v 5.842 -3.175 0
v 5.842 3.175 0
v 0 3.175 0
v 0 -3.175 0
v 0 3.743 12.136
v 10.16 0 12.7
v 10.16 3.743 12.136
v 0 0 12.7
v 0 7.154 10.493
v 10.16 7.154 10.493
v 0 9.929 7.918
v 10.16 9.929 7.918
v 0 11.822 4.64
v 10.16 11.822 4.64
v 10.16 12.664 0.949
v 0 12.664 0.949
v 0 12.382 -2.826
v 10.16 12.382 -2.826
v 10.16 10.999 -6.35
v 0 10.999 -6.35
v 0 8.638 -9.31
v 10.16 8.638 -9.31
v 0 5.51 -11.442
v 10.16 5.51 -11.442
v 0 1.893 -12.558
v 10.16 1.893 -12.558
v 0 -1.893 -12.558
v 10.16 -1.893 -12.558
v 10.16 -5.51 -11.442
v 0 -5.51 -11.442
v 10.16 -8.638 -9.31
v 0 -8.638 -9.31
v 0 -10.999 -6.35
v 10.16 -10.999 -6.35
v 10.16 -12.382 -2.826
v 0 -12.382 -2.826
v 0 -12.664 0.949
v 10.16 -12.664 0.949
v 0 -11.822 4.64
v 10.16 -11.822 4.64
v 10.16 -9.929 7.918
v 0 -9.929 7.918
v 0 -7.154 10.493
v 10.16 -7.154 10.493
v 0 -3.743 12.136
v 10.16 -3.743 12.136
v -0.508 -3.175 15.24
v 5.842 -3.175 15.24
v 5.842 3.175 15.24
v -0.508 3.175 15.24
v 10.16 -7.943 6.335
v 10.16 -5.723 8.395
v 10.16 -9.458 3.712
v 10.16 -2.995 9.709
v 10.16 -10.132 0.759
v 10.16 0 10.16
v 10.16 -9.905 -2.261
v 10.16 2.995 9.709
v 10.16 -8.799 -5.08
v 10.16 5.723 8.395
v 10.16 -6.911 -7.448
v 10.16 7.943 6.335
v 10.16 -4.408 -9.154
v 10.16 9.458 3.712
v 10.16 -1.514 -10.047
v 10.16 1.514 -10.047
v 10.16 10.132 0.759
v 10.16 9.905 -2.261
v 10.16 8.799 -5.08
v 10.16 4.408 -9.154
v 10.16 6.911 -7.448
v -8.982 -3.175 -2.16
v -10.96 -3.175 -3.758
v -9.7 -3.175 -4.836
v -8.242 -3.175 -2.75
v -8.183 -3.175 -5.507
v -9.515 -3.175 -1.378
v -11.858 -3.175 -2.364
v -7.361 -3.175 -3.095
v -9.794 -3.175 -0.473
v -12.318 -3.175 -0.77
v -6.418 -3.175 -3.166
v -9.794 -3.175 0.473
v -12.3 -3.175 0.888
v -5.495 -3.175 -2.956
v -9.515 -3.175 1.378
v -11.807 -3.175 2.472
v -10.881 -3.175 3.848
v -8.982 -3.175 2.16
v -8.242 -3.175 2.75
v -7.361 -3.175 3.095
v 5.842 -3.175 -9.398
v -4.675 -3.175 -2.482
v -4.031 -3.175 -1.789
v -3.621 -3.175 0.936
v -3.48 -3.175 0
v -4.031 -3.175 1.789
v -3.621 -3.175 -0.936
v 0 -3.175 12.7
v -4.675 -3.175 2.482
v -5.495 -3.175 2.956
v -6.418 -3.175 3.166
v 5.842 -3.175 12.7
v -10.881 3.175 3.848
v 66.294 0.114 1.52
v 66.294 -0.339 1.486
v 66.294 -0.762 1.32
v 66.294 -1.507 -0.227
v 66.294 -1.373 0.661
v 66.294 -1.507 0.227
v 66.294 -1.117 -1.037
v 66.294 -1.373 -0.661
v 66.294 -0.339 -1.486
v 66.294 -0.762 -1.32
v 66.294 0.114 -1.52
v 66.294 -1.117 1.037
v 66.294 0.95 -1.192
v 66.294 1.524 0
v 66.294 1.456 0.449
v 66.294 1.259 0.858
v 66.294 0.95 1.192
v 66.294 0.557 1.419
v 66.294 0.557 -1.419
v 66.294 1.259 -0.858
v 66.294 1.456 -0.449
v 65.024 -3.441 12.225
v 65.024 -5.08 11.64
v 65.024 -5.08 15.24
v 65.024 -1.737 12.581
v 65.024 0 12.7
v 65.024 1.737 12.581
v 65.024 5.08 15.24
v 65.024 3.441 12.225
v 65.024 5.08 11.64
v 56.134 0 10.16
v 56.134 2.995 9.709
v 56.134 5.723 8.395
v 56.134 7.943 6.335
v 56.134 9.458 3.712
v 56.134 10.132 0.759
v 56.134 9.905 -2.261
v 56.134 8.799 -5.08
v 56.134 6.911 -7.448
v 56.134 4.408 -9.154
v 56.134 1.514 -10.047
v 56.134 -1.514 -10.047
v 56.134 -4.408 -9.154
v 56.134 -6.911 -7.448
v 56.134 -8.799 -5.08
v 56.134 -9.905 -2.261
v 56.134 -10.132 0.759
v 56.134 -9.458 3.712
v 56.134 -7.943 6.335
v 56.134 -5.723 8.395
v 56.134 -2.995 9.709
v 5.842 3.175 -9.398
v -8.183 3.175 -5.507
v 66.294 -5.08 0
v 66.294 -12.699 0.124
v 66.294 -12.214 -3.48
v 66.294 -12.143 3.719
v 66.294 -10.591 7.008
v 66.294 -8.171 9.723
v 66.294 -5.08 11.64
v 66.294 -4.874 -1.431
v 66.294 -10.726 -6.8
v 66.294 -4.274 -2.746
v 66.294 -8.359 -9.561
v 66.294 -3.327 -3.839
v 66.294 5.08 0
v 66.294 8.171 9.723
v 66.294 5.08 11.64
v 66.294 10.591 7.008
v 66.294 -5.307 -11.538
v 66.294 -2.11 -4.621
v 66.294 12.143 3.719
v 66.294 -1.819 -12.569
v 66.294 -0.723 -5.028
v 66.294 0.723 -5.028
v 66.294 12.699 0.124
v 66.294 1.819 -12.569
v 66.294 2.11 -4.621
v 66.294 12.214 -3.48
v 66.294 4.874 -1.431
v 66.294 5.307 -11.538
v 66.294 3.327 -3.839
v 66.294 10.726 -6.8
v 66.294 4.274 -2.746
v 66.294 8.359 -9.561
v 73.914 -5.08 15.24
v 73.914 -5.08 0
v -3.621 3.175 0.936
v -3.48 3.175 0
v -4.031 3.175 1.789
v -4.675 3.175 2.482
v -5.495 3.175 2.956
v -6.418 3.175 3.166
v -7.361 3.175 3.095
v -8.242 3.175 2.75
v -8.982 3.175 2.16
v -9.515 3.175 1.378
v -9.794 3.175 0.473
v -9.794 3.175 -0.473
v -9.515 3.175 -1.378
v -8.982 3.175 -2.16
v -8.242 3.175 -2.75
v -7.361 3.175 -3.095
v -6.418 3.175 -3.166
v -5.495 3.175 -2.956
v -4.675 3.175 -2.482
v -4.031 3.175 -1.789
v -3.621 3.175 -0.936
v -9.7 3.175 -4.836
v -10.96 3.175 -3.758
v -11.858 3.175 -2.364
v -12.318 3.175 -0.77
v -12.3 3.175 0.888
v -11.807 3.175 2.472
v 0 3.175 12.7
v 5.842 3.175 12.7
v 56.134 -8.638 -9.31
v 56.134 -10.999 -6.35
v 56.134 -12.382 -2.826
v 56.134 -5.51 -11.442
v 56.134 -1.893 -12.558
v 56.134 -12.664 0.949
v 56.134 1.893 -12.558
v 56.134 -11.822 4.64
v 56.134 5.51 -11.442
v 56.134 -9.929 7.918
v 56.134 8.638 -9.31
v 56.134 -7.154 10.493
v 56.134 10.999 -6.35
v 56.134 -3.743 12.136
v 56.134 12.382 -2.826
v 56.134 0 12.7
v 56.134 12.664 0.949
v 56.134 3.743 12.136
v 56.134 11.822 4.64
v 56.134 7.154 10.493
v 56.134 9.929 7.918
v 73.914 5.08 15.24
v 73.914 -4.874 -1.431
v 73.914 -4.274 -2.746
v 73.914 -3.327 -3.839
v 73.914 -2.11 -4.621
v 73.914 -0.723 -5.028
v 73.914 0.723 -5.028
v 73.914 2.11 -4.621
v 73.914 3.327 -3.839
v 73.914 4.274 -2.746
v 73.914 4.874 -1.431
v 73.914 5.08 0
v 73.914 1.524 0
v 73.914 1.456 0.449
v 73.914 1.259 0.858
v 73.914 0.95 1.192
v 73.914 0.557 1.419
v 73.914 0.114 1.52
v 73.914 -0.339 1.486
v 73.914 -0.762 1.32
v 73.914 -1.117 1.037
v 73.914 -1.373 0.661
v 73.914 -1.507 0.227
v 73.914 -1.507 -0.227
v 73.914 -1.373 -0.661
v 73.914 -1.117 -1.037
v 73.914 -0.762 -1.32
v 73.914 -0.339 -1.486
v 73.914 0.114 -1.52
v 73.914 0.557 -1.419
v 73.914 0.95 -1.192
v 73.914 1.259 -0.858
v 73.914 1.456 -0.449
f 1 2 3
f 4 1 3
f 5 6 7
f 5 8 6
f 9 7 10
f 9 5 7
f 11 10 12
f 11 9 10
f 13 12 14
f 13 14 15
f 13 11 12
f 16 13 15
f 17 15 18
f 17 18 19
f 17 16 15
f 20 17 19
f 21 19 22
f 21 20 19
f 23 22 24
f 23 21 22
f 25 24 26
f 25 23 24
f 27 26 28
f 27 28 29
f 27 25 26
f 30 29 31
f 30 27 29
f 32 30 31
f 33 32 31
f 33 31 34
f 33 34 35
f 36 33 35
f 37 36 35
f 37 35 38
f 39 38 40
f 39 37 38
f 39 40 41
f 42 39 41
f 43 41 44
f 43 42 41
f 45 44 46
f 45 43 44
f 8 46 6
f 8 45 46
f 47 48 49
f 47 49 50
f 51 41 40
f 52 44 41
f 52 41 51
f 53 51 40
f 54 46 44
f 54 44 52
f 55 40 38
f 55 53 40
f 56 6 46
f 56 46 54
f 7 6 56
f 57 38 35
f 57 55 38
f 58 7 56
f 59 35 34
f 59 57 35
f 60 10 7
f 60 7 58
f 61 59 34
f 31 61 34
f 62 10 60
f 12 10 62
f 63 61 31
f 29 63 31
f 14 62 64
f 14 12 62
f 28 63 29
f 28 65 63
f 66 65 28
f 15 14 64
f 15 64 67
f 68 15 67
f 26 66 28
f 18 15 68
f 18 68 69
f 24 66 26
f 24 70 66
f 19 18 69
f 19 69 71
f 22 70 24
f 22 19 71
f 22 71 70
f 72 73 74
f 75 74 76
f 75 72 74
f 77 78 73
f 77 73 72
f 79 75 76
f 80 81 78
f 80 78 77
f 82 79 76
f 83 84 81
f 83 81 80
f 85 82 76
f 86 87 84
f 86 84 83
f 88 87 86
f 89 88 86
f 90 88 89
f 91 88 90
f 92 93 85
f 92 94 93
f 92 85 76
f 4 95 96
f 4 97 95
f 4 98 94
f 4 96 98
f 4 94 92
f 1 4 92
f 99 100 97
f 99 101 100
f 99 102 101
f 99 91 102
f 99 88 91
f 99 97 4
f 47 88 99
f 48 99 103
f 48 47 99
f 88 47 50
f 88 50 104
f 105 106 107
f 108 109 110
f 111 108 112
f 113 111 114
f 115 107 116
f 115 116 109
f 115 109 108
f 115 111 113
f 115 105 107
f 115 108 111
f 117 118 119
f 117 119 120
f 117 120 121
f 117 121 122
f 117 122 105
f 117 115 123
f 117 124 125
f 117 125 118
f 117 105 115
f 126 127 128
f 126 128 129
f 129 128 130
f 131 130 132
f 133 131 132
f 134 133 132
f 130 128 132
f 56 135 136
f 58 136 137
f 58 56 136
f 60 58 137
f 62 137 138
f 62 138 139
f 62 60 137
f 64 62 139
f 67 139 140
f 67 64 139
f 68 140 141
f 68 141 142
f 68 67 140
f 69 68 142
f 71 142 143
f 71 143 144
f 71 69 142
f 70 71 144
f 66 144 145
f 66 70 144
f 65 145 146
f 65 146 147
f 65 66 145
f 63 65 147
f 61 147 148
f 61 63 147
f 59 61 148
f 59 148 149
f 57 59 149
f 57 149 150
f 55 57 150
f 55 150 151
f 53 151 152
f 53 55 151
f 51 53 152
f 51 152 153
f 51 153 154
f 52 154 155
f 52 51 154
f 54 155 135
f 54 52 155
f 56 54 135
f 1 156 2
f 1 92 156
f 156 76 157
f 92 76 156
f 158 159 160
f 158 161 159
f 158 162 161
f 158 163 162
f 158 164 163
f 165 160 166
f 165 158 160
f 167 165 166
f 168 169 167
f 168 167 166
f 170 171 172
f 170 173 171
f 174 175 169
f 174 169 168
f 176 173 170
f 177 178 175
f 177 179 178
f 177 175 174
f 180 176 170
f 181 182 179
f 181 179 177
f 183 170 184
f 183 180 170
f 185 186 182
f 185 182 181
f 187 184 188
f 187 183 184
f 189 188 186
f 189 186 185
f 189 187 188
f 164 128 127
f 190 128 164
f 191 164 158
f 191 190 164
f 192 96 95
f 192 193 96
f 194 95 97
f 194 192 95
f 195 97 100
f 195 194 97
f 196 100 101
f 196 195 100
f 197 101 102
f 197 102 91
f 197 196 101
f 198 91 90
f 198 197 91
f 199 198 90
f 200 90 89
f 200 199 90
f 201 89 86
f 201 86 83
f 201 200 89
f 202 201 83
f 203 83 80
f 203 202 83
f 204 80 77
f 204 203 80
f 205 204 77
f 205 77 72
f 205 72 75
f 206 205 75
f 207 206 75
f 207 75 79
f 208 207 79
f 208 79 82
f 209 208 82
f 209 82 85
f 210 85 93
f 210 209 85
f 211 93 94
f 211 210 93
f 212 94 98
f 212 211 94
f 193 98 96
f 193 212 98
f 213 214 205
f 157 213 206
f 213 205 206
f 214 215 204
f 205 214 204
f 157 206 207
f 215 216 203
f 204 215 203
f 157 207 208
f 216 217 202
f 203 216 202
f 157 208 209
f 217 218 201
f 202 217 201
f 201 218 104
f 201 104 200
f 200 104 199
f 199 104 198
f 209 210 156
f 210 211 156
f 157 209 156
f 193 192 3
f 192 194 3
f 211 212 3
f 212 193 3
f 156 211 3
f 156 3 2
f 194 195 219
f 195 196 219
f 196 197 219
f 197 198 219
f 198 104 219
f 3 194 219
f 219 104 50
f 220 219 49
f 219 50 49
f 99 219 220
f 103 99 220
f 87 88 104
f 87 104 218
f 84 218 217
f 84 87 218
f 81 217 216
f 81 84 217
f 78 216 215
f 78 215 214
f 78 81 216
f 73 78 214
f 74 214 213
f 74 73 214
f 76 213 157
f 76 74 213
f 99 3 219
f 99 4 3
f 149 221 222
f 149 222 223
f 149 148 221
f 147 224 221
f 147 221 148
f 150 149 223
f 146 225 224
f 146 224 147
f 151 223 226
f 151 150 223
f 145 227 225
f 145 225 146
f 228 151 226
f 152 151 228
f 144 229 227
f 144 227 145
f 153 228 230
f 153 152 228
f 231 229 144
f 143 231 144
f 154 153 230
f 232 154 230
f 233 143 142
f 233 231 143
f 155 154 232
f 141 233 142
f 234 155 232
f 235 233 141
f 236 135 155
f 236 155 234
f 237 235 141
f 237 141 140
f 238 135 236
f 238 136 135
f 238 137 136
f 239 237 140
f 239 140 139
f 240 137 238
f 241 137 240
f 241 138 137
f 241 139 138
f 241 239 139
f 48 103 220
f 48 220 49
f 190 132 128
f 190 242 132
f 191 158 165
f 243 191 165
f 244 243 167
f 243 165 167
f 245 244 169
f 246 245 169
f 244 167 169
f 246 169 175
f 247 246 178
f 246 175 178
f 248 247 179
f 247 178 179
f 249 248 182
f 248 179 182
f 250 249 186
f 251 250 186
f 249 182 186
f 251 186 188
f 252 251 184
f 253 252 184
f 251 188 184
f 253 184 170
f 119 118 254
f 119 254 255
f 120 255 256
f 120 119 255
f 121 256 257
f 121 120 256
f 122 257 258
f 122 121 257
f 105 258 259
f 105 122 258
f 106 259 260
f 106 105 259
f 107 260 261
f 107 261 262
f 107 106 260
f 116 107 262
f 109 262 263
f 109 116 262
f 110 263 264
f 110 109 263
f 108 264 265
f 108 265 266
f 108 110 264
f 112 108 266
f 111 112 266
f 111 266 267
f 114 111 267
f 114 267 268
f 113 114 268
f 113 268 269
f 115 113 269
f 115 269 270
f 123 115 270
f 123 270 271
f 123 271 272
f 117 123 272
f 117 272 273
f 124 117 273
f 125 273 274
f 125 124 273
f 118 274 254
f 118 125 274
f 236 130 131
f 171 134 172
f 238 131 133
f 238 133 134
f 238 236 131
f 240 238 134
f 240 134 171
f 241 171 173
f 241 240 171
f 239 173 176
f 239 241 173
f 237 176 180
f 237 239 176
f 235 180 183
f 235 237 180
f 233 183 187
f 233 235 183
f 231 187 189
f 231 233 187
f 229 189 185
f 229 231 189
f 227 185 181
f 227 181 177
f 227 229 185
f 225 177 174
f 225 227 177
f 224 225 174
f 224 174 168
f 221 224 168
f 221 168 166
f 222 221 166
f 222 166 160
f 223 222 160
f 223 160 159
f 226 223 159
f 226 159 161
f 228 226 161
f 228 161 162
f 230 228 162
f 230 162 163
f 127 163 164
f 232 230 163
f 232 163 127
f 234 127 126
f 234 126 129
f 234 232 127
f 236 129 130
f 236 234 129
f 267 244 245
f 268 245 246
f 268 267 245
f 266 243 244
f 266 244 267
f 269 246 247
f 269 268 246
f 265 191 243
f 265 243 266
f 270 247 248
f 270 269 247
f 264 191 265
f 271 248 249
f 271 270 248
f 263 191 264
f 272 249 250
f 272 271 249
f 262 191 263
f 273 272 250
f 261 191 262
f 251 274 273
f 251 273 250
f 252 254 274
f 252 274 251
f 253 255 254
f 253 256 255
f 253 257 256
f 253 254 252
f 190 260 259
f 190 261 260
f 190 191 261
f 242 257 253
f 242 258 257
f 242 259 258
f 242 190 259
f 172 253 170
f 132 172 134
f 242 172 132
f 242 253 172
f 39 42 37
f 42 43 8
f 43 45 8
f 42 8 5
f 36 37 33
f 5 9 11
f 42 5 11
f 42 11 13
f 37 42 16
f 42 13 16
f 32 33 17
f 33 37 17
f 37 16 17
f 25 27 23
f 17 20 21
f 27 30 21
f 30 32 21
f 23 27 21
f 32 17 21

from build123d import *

# Parameters (mm, degrees)
F0_W     = 5.842
F0_H     = 12.7
F0_R     = 3.175
F2_DEPTH = 3.175
F3_R     = 1.524
F4_DEPTH = 7.62
F5_DEPTH = 1.27


with BuildPart() as f1:
    # F0 (on Front) → F1 (revolve)
    with BuildSketch(Plane.XZ):
        with Locations((2.921, 6.35)):
            Rectangle(F0_W, F0_H)
        Polygon((5.842, 12.7), (5.842, 0), (66.294, 0), (66.294, 12.7), (56.134, 12.7), (56.134, 10.16), (10.16, 10.16), (10.16, 12.7), align=None)
    revolve(axis=Axis((33.147, 0, 0), (-1, 0, 0)))

    # F3 (on face) → F4 (join)
    with BuildSketch(Plane.YZ.offset(66.294)):
        with BuildLine():
            ThreePointArc((-5.08, 0), (0, -5.08), (5.08, 0))
            ThreePointArc((5.08, 0), (0, 5.08), (-5.08, 0))
        make_face()
        Circle(F3_R, mode=Mode.SUBTRACT)
        with BuildLine():
            ThreePointArc((-5.08, 0), (0, 5.08), (5.08, 0))
            Line((5.08, 0), (5.08, 15.24))
            Line((5.08, 15.24), (-5.08, 15.24))
            Line((-5.08, 15.24), (-5.08, 0))
        make_face()
    extrude(amount=F4_DEPTH)

    # F5 (add): a face of the model
    f5_faces = [f1.faces().sort_by_distance(p)[0] for p in [
        (66.294, 0, 13.7792682875),
    ]]
    extrude(f5_faces, amount=F5_DEPTH)


with BuildPart() as f2:
    # F0 (on Front) → F2 (new body, symmetric)
    with BuildSketch(Plane.XZ):
        with BuildLine():
            ThreePointArc((-8.1826630726, -5.5069827884), (-3.1957909266, -4.5493385486), (-0.9398, 0))
            ThreePointArc((-0.9398, 0), (-4.5919612295, 5.3297205562), (-10.8806298187, 3.8475430269))
            ThreePointArc((-10.8806298187, 3.8475430269), (-12.1459778134, -1.5837270034), (-8.1826630726, -5.5069827884))
        make_face()
        with Locations((-6.6548, 0)):
            Circle(F0_R, mode=Mode.SUBTRACT)
        with BuildLine():
            Line((-0.9398, 0), (0, 0))
            Line((0, 0), (0, 12.7))
            Line((0, 12.7), (5.842, 12.7))
            Line((5.842, 12.7), (5.842, 15.24))
            Line((5.842, 15.24), (-0.508, 15.24))
            Line((-0.508, 15.24), (-10.8806298187, 3.8475430269))
            ThreePointArc((-10.8806298187, 3.8475430269), (-4.5919612295, 5.3297205562), (-0.9398, 0))
        make_face()
        with BuildLine():
            Line((5.842, 0), (0, 0))
            Line((0, 0), (-0.9398, 0))
            ThreePointArc((-0.9398, 0), (-3.1957909266, -4.5493385486), (-8.1826630726, -5.5069827884))
            Line((-8.1826630726, -5.5069827884), (5.842, -9.398))
            Line((5.842, -9.398), (5.842, 0))
        make_face()
    extrude(amount=F2_DEPTH, both=True)


solid = Compound([f1.part, f2.part])
